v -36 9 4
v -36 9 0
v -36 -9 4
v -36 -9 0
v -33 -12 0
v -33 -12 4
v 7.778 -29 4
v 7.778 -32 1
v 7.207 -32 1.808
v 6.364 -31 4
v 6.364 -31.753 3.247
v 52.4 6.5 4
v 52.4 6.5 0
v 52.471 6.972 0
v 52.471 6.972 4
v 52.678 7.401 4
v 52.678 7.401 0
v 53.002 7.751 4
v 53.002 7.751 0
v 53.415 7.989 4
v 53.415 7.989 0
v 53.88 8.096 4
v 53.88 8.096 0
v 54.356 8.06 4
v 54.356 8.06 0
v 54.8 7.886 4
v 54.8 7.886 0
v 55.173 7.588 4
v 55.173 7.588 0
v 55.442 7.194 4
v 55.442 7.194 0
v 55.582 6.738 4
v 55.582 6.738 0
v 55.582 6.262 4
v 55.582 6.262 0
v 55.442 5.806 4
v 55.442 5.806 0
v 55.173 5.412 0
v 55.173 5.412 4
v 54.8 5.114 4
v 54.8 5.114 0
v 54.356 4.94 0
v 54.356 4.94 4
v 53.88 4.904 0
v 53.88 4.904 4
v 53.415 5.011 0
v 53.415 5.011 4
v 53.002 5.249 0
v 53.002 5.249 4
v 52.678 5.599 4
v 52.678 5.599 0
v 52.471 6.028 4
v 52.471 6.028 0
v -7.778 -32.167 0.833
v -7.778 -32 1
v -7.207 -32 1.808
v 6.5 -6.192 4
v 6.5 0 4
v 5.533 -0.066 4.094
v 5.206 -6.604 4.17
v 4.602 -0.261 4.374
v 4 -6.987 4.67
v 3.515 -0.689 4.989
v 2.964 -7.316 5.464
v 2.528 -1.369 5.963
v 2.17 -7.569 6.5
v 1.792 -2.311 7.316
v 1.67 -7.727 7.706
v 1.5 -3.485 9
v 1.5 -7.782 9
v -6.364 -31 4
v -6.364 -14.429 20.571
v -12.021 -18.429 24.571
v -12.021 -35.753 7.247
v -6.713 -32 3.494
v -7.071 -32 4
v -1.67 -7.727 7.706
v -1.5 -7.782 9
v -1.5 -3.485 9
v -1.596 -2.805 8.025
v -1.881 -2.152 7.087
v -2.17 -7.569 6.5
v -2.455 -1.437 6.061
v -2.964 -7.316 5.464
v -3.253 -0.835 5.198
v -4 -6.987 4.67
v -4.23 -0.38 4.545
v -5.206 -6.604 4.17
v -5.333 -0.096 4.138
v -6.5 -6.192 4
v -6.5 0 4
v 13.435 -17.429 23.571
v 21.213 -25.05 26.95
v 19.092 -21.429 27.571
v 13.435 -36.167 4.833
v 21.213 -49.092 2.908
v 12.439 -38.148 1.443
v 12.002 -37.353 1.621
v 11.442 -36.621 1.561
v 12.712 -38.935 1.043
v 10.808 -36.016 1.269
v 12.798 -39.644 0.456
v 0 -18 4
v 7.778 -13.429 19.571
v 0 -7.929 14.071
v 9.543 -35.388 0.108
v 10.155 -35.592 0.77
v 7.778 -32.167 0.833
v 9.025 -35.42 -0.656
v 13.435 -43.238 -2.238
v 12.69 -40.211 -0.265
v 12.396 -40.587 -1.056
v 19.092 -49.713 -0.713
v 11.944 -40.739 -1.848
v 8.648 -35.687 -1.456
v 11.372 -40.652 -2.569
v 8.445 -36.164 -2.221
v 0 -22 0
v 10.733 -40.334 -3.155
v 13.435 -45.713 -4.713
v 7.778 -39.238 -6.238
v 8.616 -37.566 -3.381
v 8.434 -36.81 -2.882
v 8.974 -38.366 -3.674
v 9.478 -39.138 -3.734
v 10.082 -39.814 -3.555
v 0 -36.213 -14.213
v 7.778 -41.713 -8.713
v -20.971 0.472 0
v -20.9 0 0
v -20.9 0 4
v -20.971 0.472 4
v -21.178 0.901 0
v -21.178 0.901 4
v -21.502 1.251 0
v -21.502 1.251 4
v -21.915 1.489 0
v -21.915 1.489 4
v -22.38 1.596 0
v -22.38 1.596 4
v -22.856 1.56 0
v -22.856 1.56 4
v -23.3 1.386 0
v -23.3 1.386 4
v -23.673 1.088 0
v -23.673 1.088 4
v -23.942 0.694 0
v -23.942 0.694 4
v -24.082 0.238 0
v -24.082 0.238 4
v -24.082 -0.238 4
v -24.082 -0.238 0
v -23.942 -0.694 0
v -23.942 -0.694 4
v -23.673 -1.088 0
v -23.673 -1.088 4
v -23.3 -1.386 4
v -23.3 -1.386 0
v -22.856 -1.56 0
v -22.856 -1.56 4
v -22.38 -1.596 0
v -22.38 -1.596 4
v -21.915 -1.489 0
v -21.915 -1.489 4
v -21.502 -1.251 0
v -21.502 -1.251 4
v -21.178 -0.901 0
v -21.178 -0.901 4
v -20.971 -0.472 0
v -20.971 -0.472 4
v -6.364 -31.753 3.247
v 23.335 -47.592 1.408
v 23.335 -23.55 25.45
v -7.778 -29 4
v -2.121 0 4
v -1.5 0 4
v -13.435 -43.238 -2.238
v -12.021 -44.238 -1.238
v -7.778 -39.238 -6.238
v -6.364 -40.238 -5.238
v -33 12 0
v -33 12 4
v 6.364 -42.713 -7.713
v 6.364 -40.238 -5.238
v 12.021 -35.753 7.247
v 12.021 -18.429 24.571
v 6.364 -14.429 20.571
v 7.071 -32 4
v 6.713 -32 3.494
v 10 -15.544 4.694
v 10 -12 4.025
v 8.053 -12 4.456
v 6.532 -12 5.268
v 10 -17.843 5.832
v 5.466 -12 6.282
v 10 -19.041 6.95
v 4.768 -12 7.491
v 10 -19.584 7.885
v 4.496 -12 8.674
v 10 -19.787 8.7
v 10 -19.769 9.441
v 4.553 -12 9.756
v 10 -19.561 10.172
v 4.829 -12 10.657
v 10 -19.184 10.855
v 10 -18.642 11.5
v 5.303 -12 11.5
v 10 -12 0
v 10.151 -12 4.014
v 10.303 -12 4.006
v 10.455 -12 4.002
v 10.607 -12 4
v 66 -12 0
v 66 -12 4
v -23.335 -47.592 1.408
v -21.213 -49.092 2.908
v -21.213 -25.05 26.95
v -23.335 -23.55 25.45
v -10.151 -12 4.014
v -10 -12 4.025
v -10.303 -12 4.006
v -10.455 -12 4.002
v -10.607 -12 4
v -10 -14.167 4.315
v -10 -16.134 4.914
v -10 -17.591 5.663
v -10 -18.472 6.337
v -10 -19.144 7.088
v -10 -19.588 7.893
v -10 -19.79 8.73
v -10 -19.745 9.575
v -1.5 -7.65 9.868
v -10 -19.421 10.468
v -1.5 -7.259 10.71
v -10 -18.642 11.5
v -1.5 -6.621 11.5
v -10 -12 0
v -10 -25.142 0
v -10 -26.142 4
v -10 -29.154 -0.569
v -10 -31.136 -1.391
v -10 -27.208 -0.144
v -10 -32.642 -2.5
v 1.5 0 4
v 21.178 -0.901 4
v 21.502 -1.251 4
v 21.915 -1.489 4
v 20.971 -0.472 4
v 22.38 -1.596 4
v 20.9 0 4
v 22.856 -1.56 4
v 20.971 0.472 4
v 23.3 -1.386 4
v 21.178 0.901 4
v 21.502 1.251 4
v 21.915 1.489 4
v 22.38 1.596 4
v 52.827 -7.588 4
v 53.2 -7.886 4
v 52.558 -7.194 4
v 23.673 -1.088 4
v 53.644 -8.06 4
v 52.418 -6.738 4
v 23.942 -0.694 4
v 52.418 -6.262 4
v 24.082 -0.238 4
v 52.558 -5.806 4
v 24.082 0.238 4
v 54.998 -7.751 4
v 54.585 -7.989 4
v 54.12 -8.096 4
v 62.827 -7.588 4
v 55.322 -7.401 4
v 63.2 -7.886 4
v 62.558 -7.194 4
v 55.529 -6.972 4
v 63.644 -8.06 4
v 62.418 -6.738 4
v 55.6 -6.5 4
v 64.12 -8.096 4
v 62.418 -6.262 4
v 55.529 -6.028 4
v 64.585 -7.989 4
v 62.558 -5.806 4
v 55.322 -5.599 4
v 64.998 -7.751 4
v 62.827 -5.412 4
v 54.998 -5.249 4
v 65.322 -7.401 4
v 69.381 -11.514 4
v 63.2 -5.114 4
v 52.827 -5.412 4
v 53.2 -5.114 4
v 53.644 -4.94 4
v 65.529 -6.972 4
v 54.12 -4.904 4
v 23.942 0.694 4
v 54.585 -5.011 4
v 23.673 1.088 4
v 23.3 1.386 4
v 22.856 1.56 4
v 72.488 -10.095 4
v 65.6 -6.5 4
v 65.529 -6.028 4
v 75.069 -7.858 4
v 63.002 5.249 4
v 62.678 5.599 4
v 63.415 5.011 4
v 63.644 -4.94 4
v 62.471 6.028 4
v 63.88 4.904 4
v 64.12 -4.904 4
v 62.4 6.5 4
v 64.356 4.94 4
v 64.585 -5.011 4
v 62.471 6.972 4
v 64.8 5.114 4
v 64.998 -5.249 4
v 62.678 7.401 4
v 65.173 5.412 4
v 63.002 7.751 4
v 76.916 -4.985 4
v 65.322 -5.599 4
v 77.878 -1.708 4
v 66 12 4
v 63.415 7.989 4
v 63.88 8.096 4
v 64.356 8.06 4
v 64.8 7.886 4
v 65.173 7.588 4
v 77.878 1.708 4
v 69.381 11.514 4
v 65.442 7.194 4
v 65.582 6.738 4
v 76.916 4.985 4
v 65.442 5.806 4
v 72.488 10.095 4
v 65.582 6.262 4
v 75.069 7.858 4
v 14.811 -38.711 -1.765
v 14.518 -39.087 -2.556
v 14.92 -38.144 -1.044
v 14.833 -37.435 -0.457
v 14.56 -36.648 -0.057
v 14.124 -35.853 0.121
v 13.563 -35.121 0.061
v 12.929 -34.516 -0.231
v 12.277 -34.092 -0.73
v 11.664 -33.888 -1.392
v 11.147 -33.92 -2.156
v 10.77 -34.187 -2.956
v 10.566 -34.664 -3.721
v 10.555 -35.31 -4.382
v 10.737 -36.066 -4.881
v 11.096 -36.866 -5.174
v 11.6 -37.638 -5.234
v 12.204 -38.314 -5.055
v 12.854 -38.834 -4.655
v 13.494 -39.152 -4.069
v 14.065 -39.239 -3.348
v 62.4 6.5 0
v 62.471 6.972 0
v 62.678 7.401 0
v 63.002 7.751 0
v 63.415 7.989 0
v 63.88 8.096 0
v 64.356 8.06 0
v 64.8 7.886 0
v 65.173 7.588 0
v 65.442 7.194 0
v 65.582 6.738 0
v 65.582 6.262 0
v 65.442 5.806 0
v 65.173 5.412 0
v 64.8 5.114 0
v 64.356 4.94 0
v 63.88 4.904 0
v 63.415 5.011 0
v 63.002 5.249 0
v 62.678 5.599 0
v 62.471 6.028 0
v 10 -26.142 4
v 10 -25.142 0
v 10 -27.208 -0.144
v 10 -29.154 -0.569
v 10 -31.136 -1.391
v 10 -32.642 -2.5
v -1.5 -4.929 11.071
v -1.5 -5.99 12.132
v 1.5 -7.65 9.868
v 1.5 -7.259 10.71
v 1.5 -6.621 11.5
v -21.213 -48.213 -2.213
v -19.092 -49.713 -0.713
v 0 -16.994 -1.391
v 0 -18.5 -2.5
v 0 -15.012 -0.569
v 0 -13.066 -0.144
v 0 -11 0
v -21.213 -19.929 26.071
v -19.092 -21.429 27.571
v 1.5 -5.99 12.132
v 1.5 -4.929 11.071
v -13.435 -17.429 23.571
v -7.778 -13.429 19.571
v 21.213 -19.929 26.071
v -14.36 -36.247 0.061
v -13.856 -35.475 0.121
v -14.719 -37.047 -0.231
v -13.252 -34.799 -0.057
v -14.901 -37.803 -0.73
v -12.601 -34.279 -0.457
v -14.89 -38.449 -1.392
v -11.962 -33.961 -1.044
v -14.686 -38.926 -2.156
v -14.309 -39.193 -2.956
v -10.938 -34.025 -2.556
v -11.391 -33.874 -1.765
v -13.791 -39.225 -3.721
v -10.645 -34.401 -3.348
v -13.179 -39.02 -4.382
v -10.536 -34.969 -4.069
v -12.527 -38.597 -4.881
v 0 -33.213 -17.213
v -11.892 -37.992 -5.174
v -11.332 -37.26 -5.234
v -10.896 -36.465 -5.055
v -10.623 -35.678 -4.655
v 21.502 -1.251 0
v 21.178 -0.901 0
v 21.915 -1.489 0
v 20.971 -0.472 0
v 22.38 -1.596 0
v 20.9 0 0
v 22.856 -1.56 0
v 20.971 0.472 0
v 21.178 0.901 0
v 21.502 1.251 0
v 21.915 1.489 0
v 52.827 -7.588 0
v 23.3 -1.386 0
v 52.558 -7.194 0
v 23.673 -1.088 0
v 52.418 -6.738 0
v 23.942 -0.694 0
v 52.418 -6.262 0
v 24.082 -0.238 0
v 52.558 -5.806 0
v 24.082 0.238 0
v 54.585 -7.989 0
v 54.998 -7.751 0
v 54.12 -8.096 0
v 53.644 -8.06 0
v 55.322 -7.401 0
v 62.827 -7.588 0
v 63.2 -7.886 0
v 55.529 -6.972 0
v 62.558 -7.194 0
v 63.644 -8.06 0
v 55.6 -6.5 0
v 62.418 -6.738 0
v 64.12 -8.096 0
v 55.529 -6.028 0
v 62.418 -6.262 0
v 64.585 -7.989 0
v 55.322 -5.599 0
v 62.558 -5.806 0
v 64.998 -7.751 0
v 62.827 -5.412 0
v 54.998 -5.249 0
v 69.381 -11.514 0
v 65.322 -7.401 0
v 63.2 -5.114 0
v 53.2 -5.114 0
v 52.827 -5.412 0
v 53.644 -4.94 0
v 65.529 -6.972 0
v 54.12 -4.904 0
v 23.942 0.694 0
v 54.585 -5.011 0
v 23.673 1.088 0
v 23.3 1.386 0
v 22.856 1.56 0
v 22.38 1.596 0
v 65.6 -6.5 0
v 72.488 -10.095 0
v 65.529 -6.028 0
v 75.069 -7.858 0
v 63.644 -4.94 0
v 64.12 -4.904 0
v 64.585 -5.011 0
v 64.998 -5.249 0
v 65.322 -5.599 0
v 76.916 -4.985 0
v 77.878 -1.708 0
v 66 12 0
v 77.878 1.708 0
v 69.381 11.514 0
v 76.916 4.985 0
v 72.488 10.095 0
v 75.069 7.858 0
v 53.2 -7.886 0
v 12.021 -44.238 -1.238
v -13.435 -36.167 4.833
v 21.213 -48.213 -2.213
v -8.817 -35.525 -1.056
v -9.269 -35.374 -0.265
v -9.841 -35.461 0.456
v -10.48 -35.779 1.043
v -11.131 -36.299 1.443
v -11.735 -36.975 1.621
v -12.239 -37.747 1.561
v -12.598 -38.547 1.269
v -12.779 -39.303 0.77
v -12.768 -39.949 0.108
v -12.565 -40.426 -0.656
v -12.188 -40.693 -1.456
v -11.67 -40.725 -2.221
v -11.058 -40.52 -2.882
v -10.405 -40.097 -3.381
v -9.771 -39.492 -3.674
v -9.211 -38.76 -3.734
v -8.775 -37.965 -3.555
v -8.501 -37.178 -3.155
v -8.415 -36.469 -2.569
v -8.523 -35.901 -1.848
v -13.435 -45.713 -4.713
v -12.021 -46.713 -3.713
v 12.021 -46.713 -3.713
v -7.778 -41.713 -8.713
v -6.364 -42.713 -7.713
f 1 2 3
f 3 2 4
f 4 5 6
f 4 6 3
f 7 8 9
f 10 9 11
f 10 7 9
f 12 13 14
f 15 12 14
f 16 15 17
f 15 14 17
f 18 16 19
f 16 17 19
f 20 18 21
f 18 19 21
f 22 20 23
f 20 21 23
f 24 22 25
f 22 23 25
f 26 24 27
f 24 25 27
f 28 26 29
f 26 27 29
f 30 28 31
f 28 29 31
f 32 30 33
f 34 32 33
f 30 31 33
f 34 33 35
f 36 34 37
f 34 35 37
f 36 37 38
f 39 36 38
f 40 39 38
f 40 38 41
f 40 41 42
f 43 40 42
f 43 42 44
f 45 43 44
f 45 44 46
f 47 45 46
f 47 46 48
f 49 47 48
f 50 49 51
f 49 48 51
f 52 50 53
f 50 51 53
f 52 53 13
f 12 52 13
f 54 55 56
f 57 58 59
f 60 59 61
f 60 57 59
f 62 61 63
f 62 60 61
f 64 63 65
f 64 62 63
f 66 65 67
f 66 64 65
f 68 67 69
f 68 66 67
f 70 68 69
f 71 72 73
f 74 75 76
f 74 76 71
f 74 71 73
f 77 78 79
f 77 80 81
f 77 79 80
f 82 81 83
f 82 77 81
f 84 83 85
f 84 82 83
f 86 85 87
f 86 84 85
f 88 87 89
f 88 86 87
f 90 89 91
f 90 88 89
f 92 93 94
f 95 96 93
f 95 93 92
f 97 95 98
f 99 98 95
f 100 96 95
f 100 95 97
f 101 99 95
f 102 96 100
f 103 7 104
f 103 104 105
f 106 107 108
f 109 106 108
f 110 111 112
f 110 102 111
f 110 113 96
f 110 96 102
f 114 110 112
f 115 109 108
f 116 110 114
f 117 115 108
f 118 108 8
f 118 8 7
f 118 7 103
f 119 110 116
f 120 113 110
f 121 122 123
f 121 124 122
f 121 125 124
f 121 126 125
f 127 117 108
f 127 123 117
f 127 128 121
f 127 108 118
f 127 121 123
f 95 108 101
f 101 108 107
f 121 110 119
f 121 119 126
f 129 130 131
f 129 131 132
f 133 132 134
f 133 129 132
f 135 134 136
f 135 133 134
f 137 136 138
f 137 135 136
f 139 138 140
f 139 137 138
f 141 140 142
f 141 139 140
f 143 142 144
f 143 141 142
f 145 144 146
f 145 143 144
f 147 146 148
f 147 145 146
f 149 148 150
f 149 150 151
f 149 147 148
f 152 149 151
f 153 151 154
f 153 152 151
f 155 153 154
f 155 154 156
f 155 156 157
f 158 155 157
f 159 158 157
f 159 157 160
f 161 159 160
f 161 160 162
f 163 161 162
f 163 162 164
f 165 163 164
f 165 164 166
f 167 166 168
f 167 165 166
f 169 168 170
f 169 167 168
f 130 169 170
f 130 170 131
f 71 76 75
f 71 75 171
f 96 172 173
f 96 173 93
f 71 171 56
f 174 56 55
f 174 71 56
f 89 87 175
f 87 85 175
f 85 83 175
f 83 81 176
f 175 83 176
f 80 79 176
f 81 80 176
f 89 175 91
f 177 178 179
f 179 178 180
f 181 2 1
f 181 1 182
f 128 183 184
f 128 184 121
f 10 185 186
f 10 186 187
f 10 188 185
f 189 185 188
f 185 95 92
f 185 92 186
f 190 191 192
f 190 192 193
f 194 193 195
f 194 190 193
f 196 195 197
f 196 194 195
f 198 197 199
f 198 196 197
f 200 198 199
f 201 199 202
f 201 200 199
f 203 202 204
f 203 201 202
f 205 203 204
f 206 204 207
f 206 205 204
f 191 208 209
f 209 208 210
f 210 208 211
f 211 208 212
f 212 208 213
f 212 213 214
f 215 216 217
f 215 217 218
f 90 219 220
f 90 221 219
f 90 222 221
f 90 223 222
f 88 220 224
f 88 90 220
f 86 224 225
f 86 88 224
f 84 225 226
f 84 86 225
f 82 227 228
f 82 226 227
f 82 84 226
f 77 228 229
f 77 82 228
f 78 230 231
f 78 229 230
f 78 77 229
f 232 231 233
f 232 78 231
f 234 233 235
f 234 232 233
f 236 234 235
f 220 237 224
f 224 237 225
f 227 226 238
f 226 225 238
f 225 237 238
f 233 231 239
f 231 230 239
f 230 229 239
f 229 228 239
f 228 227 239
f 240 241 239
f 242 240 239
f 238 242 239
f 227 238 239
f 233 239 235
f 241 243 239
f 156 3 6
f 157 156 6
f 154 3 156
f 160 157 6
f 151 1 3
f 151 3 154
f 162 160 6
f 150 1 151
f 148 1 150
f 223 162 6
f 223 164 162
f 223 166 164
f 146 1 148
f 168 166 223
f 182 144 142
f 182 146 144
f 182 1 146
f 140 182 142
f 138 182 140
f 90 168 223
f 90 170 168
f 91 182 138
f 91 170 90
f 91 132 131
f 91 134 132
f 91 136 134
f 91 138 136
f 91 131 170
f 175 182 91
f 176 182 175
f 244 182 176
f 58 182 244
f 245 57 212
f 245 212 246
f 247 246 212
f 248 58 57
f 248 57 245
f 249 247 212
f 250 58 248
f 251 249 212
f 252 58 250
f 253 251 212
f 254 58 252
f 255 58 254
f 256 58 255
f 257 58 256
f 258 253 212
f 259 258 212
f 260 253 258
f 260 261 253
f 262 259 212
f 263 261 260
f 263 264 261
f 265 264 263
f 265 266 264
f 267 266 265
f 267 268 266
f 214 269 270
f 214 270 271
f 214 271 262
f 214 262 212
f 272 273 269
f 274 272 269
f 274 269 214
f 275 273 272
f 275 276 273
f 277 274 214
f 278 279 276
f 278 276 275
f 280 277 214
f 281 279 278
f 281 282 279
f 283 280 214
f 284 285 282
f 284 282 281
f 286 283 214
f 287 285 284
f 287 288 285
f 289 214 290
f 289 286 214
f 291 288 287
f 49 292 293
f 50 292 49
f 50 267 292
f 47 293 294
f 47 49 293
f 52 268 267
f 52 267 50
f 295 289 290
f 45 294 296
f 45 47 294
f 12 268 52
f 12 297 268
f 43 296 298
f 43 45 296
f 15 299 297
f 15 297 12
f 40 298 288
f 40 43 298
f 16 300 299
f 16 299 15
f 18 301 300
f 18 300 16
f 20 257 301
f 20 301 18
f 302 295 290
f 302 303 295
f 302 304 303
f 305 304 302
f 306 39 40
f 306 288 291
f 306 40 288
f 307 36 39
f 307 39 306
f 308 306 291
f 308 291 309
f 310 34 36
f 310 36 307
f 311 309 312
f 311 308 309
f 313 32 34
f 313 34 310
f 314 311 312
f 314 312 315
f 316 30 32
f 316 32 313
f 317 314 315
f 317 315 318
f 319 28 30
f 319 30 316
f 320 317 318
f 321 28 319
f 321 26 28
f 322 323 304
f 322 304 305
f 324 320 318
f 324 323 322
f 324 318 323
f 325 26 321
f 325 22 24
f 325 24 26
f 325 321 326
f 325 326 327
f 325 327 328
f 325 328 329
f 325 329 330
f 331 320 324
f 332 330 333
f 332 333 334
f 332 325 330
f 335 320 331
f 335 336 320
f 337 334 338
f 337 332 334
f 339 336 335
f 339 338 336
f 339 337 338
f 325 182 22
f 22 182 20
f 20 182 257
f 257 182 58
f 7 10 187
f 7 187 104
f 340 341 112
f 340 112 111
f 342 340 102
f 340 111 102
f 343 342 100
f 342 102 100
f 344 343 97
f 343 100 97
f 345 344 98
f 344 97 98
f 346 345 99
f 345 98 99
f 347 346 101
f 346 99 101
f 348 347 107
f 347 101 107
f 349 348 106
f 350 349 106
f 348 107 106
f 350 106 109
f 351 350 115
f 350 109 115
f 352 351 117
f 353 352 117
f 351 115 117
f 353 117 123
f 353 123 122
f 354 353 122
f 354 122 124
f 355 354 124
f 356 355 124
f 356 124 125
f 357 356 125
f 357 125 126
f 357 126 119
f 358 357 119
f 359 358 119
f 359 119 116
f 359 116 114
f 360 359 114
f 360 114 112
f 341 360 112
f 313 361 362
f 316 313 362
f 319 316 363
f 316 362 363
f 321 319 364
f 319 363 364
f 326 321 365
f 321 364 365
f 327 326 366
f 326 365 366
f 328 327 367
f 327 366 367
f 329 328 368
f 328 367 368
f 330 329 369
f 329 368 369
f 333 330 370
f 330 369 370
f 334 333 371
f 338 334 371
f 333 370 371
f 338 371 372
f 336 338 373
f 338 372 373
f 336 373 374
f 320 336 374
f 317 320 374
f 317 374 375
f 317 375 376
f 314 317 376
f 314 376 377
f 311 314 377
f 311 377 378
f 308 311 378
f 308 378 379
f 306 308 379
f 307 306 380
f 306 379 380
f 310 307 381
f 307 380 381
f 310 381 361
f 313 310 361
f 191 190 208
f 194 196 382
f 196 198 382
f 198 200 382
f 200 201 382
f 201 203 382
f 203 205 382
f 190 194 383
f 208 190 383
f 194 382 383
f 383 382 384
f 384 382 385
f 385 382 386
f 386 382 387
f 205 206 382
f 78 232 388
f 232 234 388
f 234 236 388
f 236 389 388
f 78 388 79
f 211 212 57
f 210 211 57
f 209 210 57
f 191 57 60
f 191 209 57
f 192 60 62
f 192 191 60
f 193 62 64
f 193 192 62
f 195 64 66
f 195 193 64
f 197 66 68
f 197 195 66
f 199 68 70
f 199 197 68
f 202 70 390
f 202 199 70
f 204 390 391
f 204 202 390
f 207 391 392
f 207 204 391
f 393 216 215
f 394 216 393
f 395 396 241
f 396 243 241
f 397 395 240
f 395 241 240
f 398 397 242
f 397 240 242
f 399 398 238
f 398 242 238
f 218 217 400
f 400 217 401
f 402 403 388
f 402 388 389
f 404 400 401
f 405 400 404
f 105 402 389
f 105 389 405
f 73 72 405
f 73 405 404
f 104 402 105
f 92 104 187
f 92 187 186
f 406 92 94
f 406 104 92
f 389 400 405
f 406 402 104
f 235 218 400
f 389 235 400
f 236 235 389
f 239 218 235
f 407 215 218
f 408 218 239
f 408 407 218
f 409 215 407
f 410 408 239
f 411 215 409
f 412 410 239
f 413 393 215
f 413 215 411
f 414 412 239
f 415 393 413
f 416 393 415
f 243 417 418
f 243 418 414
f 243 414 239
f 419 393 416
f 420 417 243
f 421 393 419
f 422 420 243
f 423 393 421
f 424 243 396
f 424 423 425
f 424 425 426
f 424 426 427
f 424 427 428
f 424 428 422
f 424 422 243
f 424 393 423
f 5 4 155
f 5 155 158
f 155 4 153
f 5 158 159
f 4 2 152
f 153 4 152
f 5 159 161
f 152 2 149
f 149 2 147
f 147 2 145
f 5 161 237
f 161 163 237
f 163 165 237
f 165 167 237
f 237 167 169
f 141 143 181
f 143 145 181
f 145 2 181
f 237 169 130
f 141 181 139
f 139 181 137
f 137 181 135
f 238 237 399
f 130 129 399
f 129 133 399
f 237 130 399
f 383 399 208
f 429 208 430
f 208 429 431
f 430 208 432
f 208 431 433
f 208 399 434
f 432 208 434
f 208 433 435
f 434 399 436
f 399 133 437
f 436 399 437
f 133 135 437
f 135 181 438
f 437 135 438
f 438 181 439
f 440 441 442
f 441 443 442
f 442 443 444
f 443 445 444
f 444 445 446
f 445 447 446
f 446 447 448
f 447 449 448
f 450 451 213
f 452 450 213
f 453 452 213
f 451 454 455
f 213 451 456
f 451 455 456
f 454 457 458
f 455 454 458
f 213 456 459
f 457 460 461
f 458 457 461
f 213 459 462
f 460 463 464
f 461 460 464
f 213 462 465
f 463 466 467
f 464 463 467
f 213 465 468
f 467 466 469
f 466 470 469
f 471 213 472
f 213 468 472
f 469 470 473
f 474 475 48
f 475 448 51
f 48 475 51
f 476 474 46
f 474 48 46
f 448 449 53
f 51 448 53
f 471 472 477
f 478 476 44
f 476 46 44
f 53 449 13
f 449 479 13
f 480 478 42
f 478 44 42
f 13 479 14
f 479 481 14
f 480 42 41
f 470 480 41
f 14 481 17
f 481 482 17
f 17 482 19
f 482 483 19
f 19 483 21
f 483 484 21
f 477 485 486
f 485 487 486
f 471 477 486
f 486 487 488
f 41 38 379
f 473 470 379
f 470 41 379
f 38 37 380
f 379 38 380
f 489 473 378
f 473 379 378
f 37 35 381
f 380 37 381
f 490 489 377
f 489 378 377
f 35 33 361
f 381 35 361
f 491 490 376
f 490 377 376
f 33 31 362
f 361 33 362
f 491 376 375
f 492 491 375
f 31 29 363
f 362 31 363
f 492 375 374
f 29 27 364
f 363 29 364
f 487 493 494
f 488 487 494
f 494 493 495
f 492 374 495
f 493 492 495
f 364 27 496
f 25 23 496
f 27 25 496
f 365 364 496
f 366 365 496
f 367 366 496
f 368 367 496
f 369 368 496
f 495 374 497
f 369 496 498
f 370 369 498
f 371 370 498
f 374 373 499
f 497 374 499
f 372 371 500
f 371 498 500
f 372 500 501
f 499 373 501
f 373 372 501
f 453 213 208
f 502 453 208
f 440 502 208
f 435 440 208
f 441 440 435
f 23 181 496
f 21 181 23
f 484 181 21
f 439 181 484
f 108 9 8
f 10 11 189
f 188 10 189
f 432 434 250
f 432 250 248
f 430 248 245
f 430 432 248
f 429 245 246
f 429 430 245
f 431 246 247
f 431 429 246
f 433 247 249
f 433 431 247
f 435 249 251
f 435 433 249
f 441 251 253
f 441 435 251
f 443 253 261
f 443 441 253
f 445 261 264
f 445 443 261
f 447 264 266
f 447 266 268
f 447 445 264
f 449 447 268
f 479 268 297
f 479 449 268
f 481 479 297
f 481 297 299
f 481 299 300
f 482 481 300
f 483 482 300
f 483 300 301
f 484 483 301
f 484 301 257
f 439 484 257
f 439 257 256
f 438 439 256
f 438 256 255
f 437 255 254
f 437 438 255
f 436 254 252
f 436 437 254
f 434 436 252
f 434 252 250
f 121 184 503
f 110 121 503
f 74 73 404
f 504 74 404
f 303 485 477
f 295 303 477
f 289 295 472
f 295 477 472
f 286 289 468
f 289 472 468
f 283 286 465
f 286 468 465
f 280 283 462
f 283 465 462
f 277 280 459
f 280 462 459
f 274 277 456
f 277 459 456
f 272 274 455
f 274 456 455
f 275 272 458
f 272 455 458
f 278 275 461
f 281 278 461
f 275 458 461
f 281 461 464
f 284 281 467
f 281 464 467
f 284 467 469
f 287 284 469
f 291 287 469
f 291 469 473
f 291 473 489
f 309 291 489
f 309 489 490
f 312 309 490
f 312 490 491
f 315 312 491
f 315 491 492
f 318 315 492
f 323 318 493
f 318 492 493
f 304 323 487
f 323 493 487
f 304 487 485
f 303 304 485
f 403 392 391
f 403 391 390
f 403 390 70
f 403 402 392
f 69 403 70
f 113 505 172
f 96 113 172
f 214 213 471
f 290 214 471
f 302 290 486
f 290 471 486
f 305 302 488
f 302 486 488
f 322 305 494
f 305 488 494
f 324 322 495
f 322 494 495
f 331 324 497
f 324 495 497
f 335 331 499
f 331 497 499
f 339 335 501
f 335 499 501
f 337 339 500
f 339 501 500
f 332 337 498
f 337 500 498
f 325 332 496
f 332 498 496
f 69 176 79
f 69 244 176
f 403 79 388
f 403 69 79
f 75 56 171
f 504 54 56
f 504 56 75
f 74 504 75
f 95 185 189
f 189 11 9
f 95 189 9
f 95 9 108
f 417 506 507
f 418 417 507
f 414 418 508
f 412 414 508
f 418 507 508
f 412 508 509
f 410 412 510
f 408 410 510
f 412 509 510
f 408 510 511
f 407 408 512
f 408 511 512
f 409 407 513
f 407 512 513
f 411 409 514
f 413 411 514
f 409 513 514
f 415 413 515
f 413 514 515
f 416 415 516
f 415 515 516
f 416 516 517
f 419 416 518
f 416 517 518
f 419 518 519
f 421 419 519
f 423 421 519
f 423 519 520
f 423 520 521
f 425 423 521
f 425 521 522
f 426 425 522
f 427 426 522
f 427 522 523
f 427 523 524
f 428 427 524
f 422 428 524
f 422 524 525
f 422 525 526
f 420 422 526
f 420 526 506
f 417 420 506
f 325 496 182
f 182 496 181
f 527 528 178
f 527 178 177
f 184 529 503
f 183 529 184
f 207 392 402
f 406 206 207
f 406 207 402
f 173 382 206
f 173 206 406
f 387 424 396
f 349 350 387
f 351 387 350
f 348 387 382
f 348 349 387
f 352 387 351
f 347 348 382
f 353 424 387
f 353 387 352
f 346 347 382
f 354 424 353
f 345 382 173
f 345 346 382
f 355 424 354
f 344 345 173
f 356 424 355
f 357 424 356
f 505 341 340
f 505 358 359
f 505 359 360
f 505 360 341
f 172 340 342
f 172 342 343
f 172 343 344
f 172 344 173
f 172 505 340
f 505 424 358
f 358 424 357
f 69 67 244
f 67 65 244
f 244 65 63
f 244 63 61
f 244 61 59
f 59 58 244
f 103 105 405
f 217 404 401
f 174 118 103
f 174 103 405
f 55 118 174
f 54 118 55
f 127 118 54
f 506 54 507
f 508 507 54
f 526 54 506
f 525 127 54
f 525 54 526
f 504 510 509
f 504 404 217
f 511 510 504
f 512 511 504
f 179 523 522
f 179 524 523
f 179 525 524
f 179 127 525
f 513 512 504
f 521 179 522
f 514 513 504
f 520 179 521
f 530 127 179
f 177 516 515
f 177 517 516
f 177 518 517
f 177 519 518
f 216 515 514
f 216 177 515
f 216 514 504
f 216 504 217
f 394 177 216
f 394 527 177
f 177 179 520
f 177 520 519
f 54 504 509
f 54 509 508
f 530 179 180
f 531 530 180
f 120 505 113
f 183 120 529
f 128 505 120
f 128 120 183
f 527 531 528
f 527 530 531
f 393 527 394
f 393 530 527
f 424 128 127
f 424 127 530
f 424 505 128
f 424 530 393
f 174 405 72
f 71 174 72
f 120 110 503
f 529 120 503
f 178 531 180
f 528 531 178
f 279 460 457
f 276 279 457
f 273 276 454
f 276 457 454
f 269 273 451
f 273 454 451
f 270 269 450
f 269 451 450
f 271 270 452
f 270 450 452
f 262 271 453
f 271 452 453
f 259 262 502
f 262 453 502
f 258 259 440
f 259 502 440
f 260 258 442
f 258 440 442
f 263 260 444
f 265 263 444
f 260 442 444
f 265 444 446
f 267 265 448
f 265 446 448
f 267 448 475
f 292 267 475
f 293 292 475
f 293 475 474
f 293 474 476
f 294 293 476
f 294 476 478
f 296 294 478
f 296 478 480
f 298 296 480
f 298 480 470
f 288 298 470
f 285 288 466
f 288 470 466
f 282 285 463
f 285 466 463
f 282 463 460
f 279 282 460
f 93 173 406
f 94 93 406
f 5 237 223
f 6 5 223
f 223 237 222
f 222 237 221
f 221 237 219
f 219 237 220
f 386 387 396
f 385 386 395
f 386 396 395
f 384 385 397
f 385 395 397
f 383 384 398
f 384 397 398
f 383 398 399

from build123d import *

# Parameters (mm, degrees)
CROQUIS1_R                   = 1.6
SALIENTE_EXTRUIR1_DEPTH      = 4
CROQUIS3_R                   = 1.6
SALIENTE_EXTRUIR3_DEPTH      = 4
SALIENTE_EXTRUIR4_DEPTH      = 10
SALIENTE_EXTRUIR4_DEPTH_BACK = 30
CORTAR_EXTRUIR8_REACH        = 102.817
CROQUIS13_R                  = 3.1
CORTAR_EXTRUIR9_DEPTH        = 2
CORTAR_EXTRUIR10_REACH       = 92.973
CROQUIS15_R                  = 3.1
CORTAR_EXTRUIR11_DEPTH       = 2
CORTAR_EXTRUIR12_DEPTH       = 99.523002923
SALIENTE_EXTRUIR5_DEPTH      = 1.5
REDONDEO1_R                  = 5
CHAFL_N1_SIZE                = 3
REDONDEO2_R                  = 5


with BuildPart() as part:
    # Croquis1 → Saliente-Extruir1 (new body)
    with BuildSketch(Plane.XY):
        Polygon((10, -12), (36, -12), (36, 12), (-36, 12), (-36, -12), (-10, -12), (-10, -32), (10, -32), align=None)
        with Locations((-22.5, 0)):
            Circle(CROQUIS1_R, mode=Mode.SUBTRACT)
        with Locations(Location((22.5, 0, 0), (0, 0, 180))):
            Circle(CROQUIS1_R, mode=Mode.SUBTRACT)
    extrude(amount=SALIENTE_EXTRUIR1_DEPTH)

    # Croquis3 → Saliente-Extruir3 (add)
    with BuildSketch(Plane(origin=(0, 0, 0), x_dir=(-1, 0, 0), z_dir=(0, 0, -1))):
        with BuildLine():
            Line((-66, 12), (-36, 12))
            Line((-36, 12), (-36, -12))
            Line((-36, -12), (-66, -12))
            ThreePointArc((-66, -12), (-78, 0), (-66, 12))
        make_face()
        with Locations((-54, 6.5)):
            Circle(CROQUIS3_R, mode=Mode.SUBTRACT)
        with Locations((-64, 6.5)):
            Circle(CROQUIS3_R, mode=Mode.SUBTRACT)
        with Locations(Location((-54, -6.5, 0), (0, 0, 180))):
            Circle(CROQUIS3_R, mode=Mode.SUBTRACT)
        with Locations(Location((-64, -6.5, 0), (0, 0, 180))):
            Circle(CROQUIS3_R, mode=Mode.SUBTRACT)
    extrude(amount=-SALIENTE_EXTRUIR3_DEPTH)

    # Croquis5 → Saliente-Extruir4 (add, two sides: drawn at the far end of the back side and taken through both)
    with BuildSketch(Plane(origin=(0, -4.201010127, -3.798989873), x_dir=(1, 0, 0), z_dir=(0, 0.7071067811865438, 0.7071067811865512)).offset(-SALIENTE_EXTRUIR4_DEPTH_BACK)):
        Polygon((-13.435028843, -28.707106781), (-21.213203436, -36.485281374), (-23.334523779, -34.363961031), (0, -11.029437252), (23.334523779, -34.363961031), (21.213203436, -36.485281374), (13.435028843, -28.707106781), (12.02081528, -30.121320344), (6.363961031, -24.464466094), (7.778174593, -23.050252532), (0, -15.272077939), (-7.778174593, -23.050252532), (-6.363961031, -24.464466094), (-12.02081528, -30.121320344), align=None)
    extrude(amount=SALIENTE_EXTRUIR4_DEPTH + SALIENTE_EXTRUIR4_DEPTH_BACK)

    # Croquis13 → Cortar-Extruir8 (cut, up to next)
    with BuildSketch(Plane(origin=(-9.192388155, -6.5, 6.5), x_dir=(0.40824829046385985, 0.2886751345948103, 0.866025403784441), z_dir=(-0.7071067811865496, -0.5000000000000013, 0.4999999999999959)), mode=Mode.PRIVATE) as cortar_extruir8_sk1:
        with Locations(Location((-7.570619935, -37.19660335, 0), (0, 0, 270))):
            Circle(CROQUIS13_R)
    cortar_extruir8_tool1 = extrude(cortar_extruir8_sk1.sketch, amount=-CORTAR_EXTRUIR8_REACH, mode=Mode.PRIVATE) & part.part
    add(cortar_extruir8_tool1.solids().sort_by_distance((9.192388, -39.056349, -0.056349))[0], mode=Mode.SUBTRACT)

    # Croquis14 → Cortar-Extruir9 (cut)
    with BuildSketch(Plane(origin=(-9.192388155, -6.5, 6.5), x_dir=(0.40824829046385985, 0.2886751345948103, 0.866025403784441), z_dir=(-0.7071067811865496, -0.5000000000000013, 0.4999999999999959))):
        Polygon((-13.554255626, -36.528693238), (-8.935453472, -43.060665885), (-1.586984244, -37.864513462), (-6.205786398, -31.332540815), align=None)
    extrude(amount=-CORTAR_EXTRUIR9_DEPTH, mode=Mode.SUBTRACT)

    # Croquis15 → Cortar-Extruir10 (cut, up to next)
    with BuildSketch(Plane(origin=(6.12825877, -4.333333333, 13), x_dir=(0.6666666666666553, 0.23570226039552375, -0.7071067811865557), z_dir=(0.7071067811865587, -0.49999999999999484, 0.4999999999999895)), mode=Mode.PRIVATE) as cortar_extruir10_sk1:
        with Locations(Location((-9.165824894, -39.075132248, 0), (0, 0, 54.735610317))):
            Circle(CROQUIS15_R)
    cortar_extruir10_tool1 = extrude(cortar_extruir10_sk1.sketch, amount=-CORTAR_EXTRUIR10_REACH, mode=Mode.PRIVATE) & part.part
    add(cortar_extruir10_tool1.solids().sort_by_distance((-9.192388, -39.056349, -0.056349))[0], mode=Mode.SUBTRACT)

    # Croquis17 → Cortar-Extruir11 (cut)
    with BuildSketch(Plane(origin=(6.12825877, -4.333333333, 13), x_dir=(0.6666666666666595, 0.2357022603955385, -0.7071067811865467), z_dir=(0.7071067811865586, -0.4999999999999948, 0.49999999999998956))):
        Polygon((-11.437061061, -44.651106269), (-3.894588728, -41.984439602), (-6.894588728, -33.499158228), (-14.437061061, -36.165824894), align=None)
    extrude(amount=-CORTAR_EXTRUIR11_DEPTH, mode=Mode.SUBTRACT)

    # Croquis18 → Cortar-Extruir12 (cut, through all)
    with BuildSketch(Plane(origin=(0, 3.071067812, 3.071067812), x_dir=(1, 0, 0), z_dir=(0, 0.7071067811865438, 0.7071067811865513))):
        Polygon((-7.071067812, -25.455844123), (-6.363961031, -24.748737342), (-7.778174593, -23.334523779), (0, -15.556349186), (7.778174593, -23.334523779), (6.363961031, -24.748737342), (7.071067812, -25.455844123), align=None)
    extrude(amount=-CORTAR_EXTRUIR12_DEPTH, mode=Mode.SUBTRACT)

    # Croquis19 → Saliente-Extruir5 (add, symmetric)
    with BuildSketch(Plane(origin=(0, 0, 0), x_dir=(0, 0, -1), z_dir=(1, 0, 0))):
        Polygon((-11.071067812, -4.928932188), (-12.636805519, -6.494669895), (-4, -15.642184556), (-4, 0), align=None)
    extrude(amount=SALIENTE_EXTRUIR5_DEPTH, both=True)

    # Redondeo1
    # the kernel refuses this fillet: 5 mm, written as the material it adds along each edge
    with BuildSketch(Plane(origin=(1.5, -26.621320344, 4), x_dir=(0, 0, 1), z_dir=(0, 1, 0))) as redondeo1_piece_1_section:
        with BuildLine():
            CenterArc((REDONDEO1_R, REDONDEO1_R), REDONDEO1_R, 180, 90)
            Line((0, REDONDEO1_R), (0, 0))
            Line((0, 0), (REDONDEO1_R, 0))
        make_face()
    redondeo1_piece_1 = extrude(amount=39.121320344, mode=Mode.PRIVATE)
    redondeo1_piece_1 = split(redondeo1_piece_1, bisect_by=Plane(origin=(2.770443411, -3.003654562, 8.309056055), z_dir=(0, -0.8203648475065346, -0.5718404646189182)), keep=Keep.TOP, mode=Mode.PRIVATE)
    redondeo1_piece_1 = split(redondeo1_piece_1, bisect_by=Plane(origin=(0.243258748, -9.601208631, 6.742811189), z_dir=(0.7071067811865499, 0.5000000000000011, -0.4999999999999958)), keep=Keep.TOP, mode=Mode.PRIVATE)
    add(redondeo1_piece_1)
    with BuildSketch(Plane(origin=(22.5, -43.819805153, 4), x_dir=(0.40824829046386, 0.28867513459481037, 0.8660254037844409), z_dir=(-0.5773502691896252, 0.8164965809277265, 0))) as redondeo1_piece_2_section:
        with BuildLine():
            CenterArc((REDONDEO1_R * 1.73205080757, REDONDEO1_R), REDONDEO1_R, 150, 120)
            Line((REDONDEO1_R * 0.866025403784, REDONDEO1_R * 1.5), (0, 0))
            Line((0, 0), (REDONDEO1_R * 1.73205080757, 0))
        make_face()
    redondeo1_piece_2 = extrude(amount=58.023702054, mode=Mode.PRIVATE)
    redondeo1_piece_2 = split(redondeo1_piece_2, bisect_by=Plane(origin=(10.121286225, -12, 4.004914318), z_dir=(0, 1, 0)), keep=Keep.TOP, mode=Mode.PRIVATE)
    redondeo1_piece_2 = split(redondeo1_piece_2, bisect_by=Plane(origin=(1.5, -11.828475377, 4.004914318), z_dir=(1, 0, 0)), keep=Keep.TOP, mode=Mode.PRIVATE)
    redondeo1_piece_2 = split(redondeo1_piece_2, bisect_by=Plane(origin=(10.121286225, -3.870234786, 9.552255859), z_dir=(0, -0.8203648475065346, -0.5718404646189182)), keep=Keep.TOP, mode=Mode.PRIVATE)
    add(redondeo1_piece_2)
    with BuildSketch(Plane(origin=(22.5, -43.819805153, 4), x_dir=(0.40824829046386, 0.28867513459481037, 0.8660254037844409), z_dir=(-0.5773502691896252, 0.8164965809277265, 0))) as redondeo1_piece_3_section:
        with BuildLine():
            CenterArc((REDONDEO1_R * 1.73205080757, REDONDEO1_R), REDONDEO1_R, 150, 120)
            Line((REDONDEO1_R * 0.866025403784, REDONDEO1_R * 1.5), (0, 0))
            Line((0, 0), (REDONDEO1_R * 1.73205080757, 0))
        make_face()
    redondeo1_piece_3 = extrude(amount=58.023702054, mode=Mode.PRIVATE)
    redondeo1_piece_3 = split(redondeo1_piece_3, bisect_by=Plane(origin=(1.5, -16.67856606, 5.887042233), z_dir=(1, 0, 0)), keep=Keep.TOP, mode=Mode.PRIVATE)
    redondeo1_piece_3 = split(redondeo1_piece_3, bisect_by=Plane(origin=(6.744949826, -6.339161533, 13.094189037), z_dir=(0, -0.8203648475065346, -0.5718404646189182)), keep=Keep.TOP, mode=Mode.PRIVATE)
    redondeo1_piece_3 = split(redondeo1_piece_3, bisect_by=Plane(origin=(10, -16.67856606, 5.887042233), z_dir=(-1, 0, 0)), keep=Keep.TOP, mode=Mode.PRIVATE)
    add(redondeo1_piece_3)
    with BuildSketch(Plane(origin=(11, 3.556349186, 4), x_dir=(-0.40824829046385974, 0.2886751345948099, 0.8660254037844413), z_dir=(-0.577350269189625, -0.8164965809277267, 0))) as redondeo1_piece_4_section:
        with BuildLine():
            CenterArc((REDONDEO1_R * 1.73205080757, REDONDEO1_R), REDONDEO1_R, 150, 120)
            Line((REDONDEO1_R * 0.866025403784, REDONDEO1_R * 1.5), (0, 0))
            Line((0, 0), (REDONDEO1_R * 1.73205080757, 0))
        make_face()
    redondeo1_piece_4 = extrude(amount=58.023702054, mode=Mode.PRIVATE)
    redondeo1_piece_4 = split(redondeo1_piece_4, bisect_by=Plane(origin=(-10, -9.487690483, 5.71835717), z_dir=(1, 0, 0)), keep=Keep.TOP, mode=Mode.PRIVATE)
    redondeo1_piece_4 = split(redondeo1_piece_4, bisect_by=Plane(origin=(-3.276486879, -3.908601143, 9.607296403), z_dir=(0, -0.8203648475065346, -0.5718404646189182)), keep=Keep.TOP, mode=Mode.PRIVATE)
    redondeo1_piece_4 = split(redondeo1_piece_4, bisect_by=Plane(origin=(-1.5, -9.487690483, 5.71835717), z_dir=(-1, 0, 0)), keep=Keep.TOP, mode=Mode.PRIVATE)
    add(redondeo1_piece_4)
    with BuildSketch(Plane(origin=(11, 3.556349186, 4), x_dir=(-0.40824829046385974, 0.2886751345948099, 0.8660254037844413), z_dir=(-0.577350269189625, -0.8164965809277267, 0))) as redondeo1_piece_5_section:
        with BuildLine():
            CenterArc((REDONDEO1_R * 1.73205080757, REDONDEO1_R), REDONDEO1_R, 150, 120)
            Line((REDONDEO1_R * 0.866025403784, REDONDEO1_R * 1.5), (0, 0))
            Line((0, 0), (REDONDEO1_R * 1.73205080757, 0))
        make_face()
    redondeo1_piece_5 = extrude(amount=58.023702054, mode=Mode.PRIVATE)
    redondeo1_piece_5 = split(redondeo1_piece_5, bisect_by=Plane(origin=(-10.121286225, -12, 4.004914318), z_dir=(0, 1, 0)), keep=Keep.TOP, mode=Mode.PRIVATE)
    redondeo1_piece_5 = split(redondeo1_piece_5, bisect_by=Plane(origin=(-10.121286225, -3.870234786, 9.552255859), z_dir=(0, -0.8203648475065346, -0.5718404646189182)), keep=Keep.TOP, mode=Mode.PRIVATE)
    redondeo1_piece_5 = split(redondeo1_piece_5, bisect_by=Plane(origin=(-1.5, -11.828475377, 4.004914318), z_dir=(-1, 0, 0)), keep=Keep.TOP, mode=Mode.PRIVATE)
    add(redondeo1_piece_5)
    with BuildSketch(Plane(origin=(-1.5, -26.621320344, 4), x_dir=(0, 0, 1), z_dir=(0, 1, 0))) as redondeo1_piece_6_section:
        with BuildLine():
            CenterArc((REDONDEO1_R, -REDONDEO1_R), REDONDEO1_R, 90, 90)
            Line((0, -REDONDEO1_R), (0, 0))
            Line((0, 0), (REDONDEO1_R, 0))
        make_face()
    redondeo1_piece_6 = extrude(amount=39.121320344, mode=Mode.PRIVATE)
    redondeo1_piece_6 = split(redondeo1_piece_6, bisect_by=Plane(origin=(1.878061596, -11.101208631, 8.242811189), z_dir=(-0.7071067811865511, 0.5000000000000001, -0.4999999999999948)), keep=Keep.TOP, mode=Mode.PRIVATE)
    redondeo1_piece_6 = split(redondeo1_piece_6, bisect_by=Plane(origin=(-2.770443411, -3.003654562, 8.309056055), z_dir=(0, -0.8203648475065346, -0.5718404646189182)), keep=Keep.TOP, mode=Mode.PRIVATE)
    add(redondeo1_piece_6)

    # Chaflán1
    # the kernel refuses this chamfer: 3 mm, written as the material it takes off along each edge
    with BuildSketch(Plane(origin=(0.908597591, -30.016844189, -2.731893153), x_dir=(-0.01944252080601415, 0.6930914977653764, 0.7205873743759705), z_dir=(0.7071067811865457, -0.5000000000000041, 0.49999999999999856))) as chafl_n1_piece_1_section:
        Polygon((CHAFL_N1_SIZE * 0.999621916911, -CHAFL_N1_SIZE * 0.0274958766106), (-CHAFL_N1_SIZE * 0.0274958766106, -CHAFL_N1_SIZE * 0.999621916911), (0, 0), align=None)
    chafl_n1_piece_1 = extrude(amount=23.430097928, mode=Mode.PRIVATE)
    chafl_n1_piece_1 = split(chafl_n1_piece_1, bisect_by=Plane(origin=(10.606601718, -34.102143715, 2.897856285), z_dir=(-0.7071067811865376, -0.5000000000000097, 0.5000000000000046)), keep=Keep.TOP, mode=Mode.PRIVATE)
    add(chafl_n1_piece_1, mode=Mode.SUBTRACT)
    with BuildSketch(Plane(origin=(-36, -12, -7.715048964), x_dir=(0.9996219169112968, -0.02749587661058619, 0), z_dir=(0, 0, 1)), Plane(origin=(-36, 12, -7.715048964), x_dir=(-0.02749587661058678, -0.9996219169112968, 0), z_dir=(0, 0, 1))) as chafl_n1_piece_2:
        Polygon((CHAFL_N1_SIZE * 0.999621916911, CHAFL_N1_SIZE * 0.0274958766106), (-CHAFL_N1_SIZE * 0.0274958766106, CHAFL_N1_SIZE * 0.999621916911), (0, 0), align=None)
    extrude(amount=19.430097928, mode=Mode.SUBTRACT)
    with BuildSketch(Plane(origin=(-17.47617872, -41.731893153, 8.983155811), x_dir=(-0.7068394360706848, 0.48036843764962867, -0.5192534792616522), z_dir=(0.7071067811865362, 0.5000000000000103, -0.5000000000000059))) as chafl_n1_piece_3_section:
        Polygon((CHAFL_N1_SIZE * 0.999621916911, CHAFL_N1_SIZE * 0.0274958766106), (-CHAFL_N1_SIZE * 0.0274958766106, CHAFL_N1_SIZE * 0.999621916911), (0, 0), align=None)
    chafl_n1_piece_3 = extrude(amount=23.430097928, mode=Mode.PRIVATE)
    chafl_n1_piece_3 = split(chafl_n1_piece_3, bisect_by=Plane(origin=(-10.606601718, -34.102143715, 2.897856285), z_dir=(0.7071067811865511, -0.5000000000000001, 0.4999999999999948)), keep=Keep.TOP, mode=Mode.PRIVATE)
    add(chafl_n1_piece_3, mode=Mode.SUBTRACT)
    with BuildSketch(Plane(origin=(-15.757839996, -55.070727918, 4.644321046), x_dir=(-0.01944252080601493, 0.693091497765376, 0.7205873743759708), z_dir=(-0.7071067811865476, 0.5000000000000027, -0.4999999999999974))) as chafl_n1_piece_4:
        Polygon((CHAFL_N1_SIZE * 0.999621916911, CHAFL_N1_SIZE * 0.0274958766106), (-CHAFL_N1_SIZE * 0.0274958766106, CHAFL_N1_SIZE * 0.999621916911), (0, 0), align=None)
    extrude(amount=18.430097928, mode=Mode.SUBTRACT)
    with BuildSketch(Plane(origin=(28.789887219, -45.855678954, -4.570727918), x_dir=(-0.7068394360706699, 0.48036843764963866, -0.5192534792616634), z_dir=(-0.7071067811865511, -0.5000000000000001, 0.4999999999999949)), Plane(origin=(-15.757839996, -26.78645667, 32.928592294), x_dir=(-0.019442520806013802, -0.7205873743759628, -0.6930914977653844), z_dir=(-0.7071067811865476, 0.5000000000000027, -0.4999999999999974)), Plane(origin=(28.789887219, -17.571407706, 23.71354333), x_dir=(0.019442520806014007, -0.7205873743759631, -0.693091497765384), z_dir=(-0.7071067811865511, -0.5000000000000001, 0.4999999999999949))) as chafl_n1_piece_5:
        Polygon((CHAFL_N1_SIZE * 0.999621916911, -CHAFL_N1_SIZE * 0.0274958766106), (-CHAFL_N1_SIZE * 0.0274958766106, -CHAFL_N1_SIZE * 0.999621916911), (0, 0), align=None)
    extrude(amount=18.430097928, mode=Mode.SUBTRACT)

    # Redondeo2
    redondeo2_edges = [part.edges().sort_by_distance(p)[0] for p in [
        (-5, -23.071067812, 0),
        (5, -23.071067812, 0),
    ]]
    fillet(redondeo2_edges, radius=REDONDEO2_R)


solid = part.part
